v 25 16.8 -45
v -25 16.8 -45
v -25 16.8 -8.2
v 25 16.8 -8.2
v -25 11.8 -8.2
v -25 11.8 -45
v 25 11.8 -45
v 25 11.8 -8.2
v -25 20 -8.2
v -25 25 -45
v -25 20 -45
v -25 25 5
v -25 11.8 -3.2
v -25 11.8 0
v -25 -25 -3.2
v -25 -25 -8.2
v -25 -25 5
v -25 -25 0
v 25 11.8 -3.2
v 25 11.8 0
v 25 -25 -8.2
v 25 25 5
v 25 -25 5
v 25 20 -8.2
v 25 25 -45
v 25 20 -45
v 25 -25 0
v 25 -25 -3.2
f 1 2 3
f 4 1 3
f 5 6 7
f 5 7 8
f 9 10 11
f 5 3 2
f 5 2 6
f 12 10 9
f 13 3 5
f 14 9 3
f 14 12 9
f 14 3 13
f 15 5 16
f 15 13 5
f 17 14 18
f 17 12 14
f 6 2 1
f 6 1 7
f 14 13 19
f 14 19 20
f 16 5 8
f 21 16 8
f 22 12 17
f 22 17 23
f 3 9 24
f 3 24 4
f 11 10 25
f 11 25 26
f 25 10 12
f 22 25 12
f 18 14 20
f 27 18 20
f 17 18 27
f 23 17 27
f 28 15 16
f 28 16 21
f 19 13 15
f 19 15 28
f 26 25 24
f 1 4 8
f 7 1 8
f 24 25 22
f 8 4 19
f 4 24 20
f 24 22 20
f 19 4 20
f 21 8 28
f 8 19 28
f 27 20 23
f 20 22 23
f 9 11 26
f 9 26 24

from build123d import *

# Parameters (mm, degrees)
F0_W     = 50
F0_H     = 50
F1_DEPTH = 5
F2_W     = 5
F2_H     = 50
F3_DEPTH = 50
F4_W     = 50
F4_H     = 5
F5_DEPTH = 36.8
F6_W     = 3.2
F6_H     = 8.2
F7_DEPTH = 50


# Not quite as in the source:
# - a feature names something its author has since deleted; it is built from what else it names


with BuildPart() as f1:
    # F0 (on Top) → F1 (new body)
    with BuildSketch(Plane.XY):
        Rectangle(F0_W, F0_H)
    extrude(amount=F1_DEPTH)

    # F2 (on face) → F3 (join, through all)
    with BuildSketch(Plane(origin=(-25, 0, 0), x_dir=(0, -1, 0), z_dir=(-1, 0, 0))):
        with Locations((-22.5, -20)):
            Rectangle(F2_W, F2_H)
        with Locations((-14.3, -20)):
            Rectangle(F2_W, F2_H)
    extrude(amount=-F3_DEPTH)

    # F4 (on face) → F5 (join, through all)
    with BuildSketch(Plane.XZ.offset(-11.8)):
        with Locations((0, -5.7)):
            Rectangle(F4_W, F4_H)
    extrude(amount=F5_DEPTH)

    # F6 (on face) → F7 (join, through all)
    with BuildSketch(Plane(origin=(-25, 0, 0), x_dir=(0, -1, 0), z_dir=(-1, 0, 0))):
        with Locations((-18.4, -4.1)):
            Rectangle(F6_W, F6_H)
    extrude(amount=-F7_DEPTH)


solid = f1.part
